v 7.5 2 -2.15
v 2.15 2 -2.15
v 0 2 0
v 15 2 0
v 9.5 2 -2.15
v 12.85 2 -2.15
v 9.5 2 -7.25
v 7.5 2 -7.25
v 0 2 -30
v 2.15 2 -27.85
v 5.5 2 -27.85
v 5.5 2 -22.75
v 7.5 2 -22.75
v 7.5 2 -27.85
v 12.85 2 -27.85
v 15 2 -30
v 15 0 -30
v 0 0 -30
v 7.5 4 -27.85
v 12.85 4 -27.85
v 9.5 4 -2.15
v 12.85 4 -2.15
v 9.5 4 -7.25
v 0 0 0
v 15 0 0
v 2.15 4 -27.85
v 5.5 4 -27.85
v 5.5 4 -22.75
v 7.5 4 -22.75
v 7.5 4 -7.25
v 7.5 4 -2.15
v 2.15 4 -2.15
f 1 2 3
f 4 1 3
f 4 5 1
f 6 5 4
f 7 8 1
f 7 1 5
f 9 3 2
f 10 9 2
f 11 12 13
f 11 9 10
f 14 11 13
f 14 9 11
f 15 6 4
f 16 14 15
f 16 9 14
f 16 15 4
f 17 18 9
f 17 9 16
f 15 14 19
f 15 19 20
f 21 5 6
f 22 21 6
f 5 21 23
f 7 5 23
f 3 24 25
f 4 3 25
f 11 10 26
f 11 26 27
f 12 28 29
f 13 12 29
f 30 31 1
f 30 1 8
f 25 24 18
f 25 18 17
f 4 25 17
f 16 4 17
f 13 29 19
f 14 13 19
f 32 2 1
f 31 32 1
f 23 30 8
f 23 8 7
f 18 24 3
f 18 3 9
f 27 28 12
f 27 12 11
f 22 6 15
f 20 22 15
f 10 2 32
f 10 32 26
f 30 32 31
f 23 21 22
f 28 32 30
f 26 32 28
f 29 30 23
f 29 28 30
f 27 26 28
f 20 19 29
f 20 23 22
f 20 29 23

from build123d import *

# Parameters (mm, degrees)
SKETCH1_W           = 15
SKETCH1_H           = 30
BOSS_EXTRUDE1_DEPTH = 2
SKETCH2_W           = 10.7
SKETCH2_H           = 25.7
BOSS_EXTRUDE2_DEPTH = 2
SKETCH3_W           = 2
SKETCH3_H           = 5.1
CUT_EXTRUDE1_DEPTH  = 2


with BuildPart() as part:
    # Sketch1 → Boss-Extrude1 (new body)
    with BuildSketch(Plane(origin=(0, 0, 0), x_dir=(1, 0, 0), z_dir=(0, 1, 0))):
        with Locations((7.5, 15)):
            Rectangle(SKETCH1_W, SKETCH1_H)
    extrude(amount=BOSS_EXTRUDE1_DEPTH)

    # Sketch2 → Boss-Extrude2 (add)
    with BuildSketch(Plane(origin=(0, 2, 0), x_dir=(1, 0, 0), z_dir=(0, 1, 0))):
        with Locations((7.5, 15)):
            Rectangle(SKETCH2_W, SKETCH2_H)
    extrude(amount=BOSS_EXTRUDE2_DEPTH)

    # Sketch3 → Cut-Extrude1 (cut)
    with BuildSketch(Plane(origin=(0, 4, 0), x_dir=(1, 0, 0), z_dir=(0, 1, 0))):
        with Locations((6.5, 25.3)):
            Rectangle(SKETCH3_W, SKETCH3_H)
        with Locations((8.5, 4.7)):
            Rectangle(SKETCH3_W, SKETCH3_H)
    extrude(amount=-CUT_EXTRUDE1_DEPTH, mode=Mode.SUBTRACT)


solid = part.part
